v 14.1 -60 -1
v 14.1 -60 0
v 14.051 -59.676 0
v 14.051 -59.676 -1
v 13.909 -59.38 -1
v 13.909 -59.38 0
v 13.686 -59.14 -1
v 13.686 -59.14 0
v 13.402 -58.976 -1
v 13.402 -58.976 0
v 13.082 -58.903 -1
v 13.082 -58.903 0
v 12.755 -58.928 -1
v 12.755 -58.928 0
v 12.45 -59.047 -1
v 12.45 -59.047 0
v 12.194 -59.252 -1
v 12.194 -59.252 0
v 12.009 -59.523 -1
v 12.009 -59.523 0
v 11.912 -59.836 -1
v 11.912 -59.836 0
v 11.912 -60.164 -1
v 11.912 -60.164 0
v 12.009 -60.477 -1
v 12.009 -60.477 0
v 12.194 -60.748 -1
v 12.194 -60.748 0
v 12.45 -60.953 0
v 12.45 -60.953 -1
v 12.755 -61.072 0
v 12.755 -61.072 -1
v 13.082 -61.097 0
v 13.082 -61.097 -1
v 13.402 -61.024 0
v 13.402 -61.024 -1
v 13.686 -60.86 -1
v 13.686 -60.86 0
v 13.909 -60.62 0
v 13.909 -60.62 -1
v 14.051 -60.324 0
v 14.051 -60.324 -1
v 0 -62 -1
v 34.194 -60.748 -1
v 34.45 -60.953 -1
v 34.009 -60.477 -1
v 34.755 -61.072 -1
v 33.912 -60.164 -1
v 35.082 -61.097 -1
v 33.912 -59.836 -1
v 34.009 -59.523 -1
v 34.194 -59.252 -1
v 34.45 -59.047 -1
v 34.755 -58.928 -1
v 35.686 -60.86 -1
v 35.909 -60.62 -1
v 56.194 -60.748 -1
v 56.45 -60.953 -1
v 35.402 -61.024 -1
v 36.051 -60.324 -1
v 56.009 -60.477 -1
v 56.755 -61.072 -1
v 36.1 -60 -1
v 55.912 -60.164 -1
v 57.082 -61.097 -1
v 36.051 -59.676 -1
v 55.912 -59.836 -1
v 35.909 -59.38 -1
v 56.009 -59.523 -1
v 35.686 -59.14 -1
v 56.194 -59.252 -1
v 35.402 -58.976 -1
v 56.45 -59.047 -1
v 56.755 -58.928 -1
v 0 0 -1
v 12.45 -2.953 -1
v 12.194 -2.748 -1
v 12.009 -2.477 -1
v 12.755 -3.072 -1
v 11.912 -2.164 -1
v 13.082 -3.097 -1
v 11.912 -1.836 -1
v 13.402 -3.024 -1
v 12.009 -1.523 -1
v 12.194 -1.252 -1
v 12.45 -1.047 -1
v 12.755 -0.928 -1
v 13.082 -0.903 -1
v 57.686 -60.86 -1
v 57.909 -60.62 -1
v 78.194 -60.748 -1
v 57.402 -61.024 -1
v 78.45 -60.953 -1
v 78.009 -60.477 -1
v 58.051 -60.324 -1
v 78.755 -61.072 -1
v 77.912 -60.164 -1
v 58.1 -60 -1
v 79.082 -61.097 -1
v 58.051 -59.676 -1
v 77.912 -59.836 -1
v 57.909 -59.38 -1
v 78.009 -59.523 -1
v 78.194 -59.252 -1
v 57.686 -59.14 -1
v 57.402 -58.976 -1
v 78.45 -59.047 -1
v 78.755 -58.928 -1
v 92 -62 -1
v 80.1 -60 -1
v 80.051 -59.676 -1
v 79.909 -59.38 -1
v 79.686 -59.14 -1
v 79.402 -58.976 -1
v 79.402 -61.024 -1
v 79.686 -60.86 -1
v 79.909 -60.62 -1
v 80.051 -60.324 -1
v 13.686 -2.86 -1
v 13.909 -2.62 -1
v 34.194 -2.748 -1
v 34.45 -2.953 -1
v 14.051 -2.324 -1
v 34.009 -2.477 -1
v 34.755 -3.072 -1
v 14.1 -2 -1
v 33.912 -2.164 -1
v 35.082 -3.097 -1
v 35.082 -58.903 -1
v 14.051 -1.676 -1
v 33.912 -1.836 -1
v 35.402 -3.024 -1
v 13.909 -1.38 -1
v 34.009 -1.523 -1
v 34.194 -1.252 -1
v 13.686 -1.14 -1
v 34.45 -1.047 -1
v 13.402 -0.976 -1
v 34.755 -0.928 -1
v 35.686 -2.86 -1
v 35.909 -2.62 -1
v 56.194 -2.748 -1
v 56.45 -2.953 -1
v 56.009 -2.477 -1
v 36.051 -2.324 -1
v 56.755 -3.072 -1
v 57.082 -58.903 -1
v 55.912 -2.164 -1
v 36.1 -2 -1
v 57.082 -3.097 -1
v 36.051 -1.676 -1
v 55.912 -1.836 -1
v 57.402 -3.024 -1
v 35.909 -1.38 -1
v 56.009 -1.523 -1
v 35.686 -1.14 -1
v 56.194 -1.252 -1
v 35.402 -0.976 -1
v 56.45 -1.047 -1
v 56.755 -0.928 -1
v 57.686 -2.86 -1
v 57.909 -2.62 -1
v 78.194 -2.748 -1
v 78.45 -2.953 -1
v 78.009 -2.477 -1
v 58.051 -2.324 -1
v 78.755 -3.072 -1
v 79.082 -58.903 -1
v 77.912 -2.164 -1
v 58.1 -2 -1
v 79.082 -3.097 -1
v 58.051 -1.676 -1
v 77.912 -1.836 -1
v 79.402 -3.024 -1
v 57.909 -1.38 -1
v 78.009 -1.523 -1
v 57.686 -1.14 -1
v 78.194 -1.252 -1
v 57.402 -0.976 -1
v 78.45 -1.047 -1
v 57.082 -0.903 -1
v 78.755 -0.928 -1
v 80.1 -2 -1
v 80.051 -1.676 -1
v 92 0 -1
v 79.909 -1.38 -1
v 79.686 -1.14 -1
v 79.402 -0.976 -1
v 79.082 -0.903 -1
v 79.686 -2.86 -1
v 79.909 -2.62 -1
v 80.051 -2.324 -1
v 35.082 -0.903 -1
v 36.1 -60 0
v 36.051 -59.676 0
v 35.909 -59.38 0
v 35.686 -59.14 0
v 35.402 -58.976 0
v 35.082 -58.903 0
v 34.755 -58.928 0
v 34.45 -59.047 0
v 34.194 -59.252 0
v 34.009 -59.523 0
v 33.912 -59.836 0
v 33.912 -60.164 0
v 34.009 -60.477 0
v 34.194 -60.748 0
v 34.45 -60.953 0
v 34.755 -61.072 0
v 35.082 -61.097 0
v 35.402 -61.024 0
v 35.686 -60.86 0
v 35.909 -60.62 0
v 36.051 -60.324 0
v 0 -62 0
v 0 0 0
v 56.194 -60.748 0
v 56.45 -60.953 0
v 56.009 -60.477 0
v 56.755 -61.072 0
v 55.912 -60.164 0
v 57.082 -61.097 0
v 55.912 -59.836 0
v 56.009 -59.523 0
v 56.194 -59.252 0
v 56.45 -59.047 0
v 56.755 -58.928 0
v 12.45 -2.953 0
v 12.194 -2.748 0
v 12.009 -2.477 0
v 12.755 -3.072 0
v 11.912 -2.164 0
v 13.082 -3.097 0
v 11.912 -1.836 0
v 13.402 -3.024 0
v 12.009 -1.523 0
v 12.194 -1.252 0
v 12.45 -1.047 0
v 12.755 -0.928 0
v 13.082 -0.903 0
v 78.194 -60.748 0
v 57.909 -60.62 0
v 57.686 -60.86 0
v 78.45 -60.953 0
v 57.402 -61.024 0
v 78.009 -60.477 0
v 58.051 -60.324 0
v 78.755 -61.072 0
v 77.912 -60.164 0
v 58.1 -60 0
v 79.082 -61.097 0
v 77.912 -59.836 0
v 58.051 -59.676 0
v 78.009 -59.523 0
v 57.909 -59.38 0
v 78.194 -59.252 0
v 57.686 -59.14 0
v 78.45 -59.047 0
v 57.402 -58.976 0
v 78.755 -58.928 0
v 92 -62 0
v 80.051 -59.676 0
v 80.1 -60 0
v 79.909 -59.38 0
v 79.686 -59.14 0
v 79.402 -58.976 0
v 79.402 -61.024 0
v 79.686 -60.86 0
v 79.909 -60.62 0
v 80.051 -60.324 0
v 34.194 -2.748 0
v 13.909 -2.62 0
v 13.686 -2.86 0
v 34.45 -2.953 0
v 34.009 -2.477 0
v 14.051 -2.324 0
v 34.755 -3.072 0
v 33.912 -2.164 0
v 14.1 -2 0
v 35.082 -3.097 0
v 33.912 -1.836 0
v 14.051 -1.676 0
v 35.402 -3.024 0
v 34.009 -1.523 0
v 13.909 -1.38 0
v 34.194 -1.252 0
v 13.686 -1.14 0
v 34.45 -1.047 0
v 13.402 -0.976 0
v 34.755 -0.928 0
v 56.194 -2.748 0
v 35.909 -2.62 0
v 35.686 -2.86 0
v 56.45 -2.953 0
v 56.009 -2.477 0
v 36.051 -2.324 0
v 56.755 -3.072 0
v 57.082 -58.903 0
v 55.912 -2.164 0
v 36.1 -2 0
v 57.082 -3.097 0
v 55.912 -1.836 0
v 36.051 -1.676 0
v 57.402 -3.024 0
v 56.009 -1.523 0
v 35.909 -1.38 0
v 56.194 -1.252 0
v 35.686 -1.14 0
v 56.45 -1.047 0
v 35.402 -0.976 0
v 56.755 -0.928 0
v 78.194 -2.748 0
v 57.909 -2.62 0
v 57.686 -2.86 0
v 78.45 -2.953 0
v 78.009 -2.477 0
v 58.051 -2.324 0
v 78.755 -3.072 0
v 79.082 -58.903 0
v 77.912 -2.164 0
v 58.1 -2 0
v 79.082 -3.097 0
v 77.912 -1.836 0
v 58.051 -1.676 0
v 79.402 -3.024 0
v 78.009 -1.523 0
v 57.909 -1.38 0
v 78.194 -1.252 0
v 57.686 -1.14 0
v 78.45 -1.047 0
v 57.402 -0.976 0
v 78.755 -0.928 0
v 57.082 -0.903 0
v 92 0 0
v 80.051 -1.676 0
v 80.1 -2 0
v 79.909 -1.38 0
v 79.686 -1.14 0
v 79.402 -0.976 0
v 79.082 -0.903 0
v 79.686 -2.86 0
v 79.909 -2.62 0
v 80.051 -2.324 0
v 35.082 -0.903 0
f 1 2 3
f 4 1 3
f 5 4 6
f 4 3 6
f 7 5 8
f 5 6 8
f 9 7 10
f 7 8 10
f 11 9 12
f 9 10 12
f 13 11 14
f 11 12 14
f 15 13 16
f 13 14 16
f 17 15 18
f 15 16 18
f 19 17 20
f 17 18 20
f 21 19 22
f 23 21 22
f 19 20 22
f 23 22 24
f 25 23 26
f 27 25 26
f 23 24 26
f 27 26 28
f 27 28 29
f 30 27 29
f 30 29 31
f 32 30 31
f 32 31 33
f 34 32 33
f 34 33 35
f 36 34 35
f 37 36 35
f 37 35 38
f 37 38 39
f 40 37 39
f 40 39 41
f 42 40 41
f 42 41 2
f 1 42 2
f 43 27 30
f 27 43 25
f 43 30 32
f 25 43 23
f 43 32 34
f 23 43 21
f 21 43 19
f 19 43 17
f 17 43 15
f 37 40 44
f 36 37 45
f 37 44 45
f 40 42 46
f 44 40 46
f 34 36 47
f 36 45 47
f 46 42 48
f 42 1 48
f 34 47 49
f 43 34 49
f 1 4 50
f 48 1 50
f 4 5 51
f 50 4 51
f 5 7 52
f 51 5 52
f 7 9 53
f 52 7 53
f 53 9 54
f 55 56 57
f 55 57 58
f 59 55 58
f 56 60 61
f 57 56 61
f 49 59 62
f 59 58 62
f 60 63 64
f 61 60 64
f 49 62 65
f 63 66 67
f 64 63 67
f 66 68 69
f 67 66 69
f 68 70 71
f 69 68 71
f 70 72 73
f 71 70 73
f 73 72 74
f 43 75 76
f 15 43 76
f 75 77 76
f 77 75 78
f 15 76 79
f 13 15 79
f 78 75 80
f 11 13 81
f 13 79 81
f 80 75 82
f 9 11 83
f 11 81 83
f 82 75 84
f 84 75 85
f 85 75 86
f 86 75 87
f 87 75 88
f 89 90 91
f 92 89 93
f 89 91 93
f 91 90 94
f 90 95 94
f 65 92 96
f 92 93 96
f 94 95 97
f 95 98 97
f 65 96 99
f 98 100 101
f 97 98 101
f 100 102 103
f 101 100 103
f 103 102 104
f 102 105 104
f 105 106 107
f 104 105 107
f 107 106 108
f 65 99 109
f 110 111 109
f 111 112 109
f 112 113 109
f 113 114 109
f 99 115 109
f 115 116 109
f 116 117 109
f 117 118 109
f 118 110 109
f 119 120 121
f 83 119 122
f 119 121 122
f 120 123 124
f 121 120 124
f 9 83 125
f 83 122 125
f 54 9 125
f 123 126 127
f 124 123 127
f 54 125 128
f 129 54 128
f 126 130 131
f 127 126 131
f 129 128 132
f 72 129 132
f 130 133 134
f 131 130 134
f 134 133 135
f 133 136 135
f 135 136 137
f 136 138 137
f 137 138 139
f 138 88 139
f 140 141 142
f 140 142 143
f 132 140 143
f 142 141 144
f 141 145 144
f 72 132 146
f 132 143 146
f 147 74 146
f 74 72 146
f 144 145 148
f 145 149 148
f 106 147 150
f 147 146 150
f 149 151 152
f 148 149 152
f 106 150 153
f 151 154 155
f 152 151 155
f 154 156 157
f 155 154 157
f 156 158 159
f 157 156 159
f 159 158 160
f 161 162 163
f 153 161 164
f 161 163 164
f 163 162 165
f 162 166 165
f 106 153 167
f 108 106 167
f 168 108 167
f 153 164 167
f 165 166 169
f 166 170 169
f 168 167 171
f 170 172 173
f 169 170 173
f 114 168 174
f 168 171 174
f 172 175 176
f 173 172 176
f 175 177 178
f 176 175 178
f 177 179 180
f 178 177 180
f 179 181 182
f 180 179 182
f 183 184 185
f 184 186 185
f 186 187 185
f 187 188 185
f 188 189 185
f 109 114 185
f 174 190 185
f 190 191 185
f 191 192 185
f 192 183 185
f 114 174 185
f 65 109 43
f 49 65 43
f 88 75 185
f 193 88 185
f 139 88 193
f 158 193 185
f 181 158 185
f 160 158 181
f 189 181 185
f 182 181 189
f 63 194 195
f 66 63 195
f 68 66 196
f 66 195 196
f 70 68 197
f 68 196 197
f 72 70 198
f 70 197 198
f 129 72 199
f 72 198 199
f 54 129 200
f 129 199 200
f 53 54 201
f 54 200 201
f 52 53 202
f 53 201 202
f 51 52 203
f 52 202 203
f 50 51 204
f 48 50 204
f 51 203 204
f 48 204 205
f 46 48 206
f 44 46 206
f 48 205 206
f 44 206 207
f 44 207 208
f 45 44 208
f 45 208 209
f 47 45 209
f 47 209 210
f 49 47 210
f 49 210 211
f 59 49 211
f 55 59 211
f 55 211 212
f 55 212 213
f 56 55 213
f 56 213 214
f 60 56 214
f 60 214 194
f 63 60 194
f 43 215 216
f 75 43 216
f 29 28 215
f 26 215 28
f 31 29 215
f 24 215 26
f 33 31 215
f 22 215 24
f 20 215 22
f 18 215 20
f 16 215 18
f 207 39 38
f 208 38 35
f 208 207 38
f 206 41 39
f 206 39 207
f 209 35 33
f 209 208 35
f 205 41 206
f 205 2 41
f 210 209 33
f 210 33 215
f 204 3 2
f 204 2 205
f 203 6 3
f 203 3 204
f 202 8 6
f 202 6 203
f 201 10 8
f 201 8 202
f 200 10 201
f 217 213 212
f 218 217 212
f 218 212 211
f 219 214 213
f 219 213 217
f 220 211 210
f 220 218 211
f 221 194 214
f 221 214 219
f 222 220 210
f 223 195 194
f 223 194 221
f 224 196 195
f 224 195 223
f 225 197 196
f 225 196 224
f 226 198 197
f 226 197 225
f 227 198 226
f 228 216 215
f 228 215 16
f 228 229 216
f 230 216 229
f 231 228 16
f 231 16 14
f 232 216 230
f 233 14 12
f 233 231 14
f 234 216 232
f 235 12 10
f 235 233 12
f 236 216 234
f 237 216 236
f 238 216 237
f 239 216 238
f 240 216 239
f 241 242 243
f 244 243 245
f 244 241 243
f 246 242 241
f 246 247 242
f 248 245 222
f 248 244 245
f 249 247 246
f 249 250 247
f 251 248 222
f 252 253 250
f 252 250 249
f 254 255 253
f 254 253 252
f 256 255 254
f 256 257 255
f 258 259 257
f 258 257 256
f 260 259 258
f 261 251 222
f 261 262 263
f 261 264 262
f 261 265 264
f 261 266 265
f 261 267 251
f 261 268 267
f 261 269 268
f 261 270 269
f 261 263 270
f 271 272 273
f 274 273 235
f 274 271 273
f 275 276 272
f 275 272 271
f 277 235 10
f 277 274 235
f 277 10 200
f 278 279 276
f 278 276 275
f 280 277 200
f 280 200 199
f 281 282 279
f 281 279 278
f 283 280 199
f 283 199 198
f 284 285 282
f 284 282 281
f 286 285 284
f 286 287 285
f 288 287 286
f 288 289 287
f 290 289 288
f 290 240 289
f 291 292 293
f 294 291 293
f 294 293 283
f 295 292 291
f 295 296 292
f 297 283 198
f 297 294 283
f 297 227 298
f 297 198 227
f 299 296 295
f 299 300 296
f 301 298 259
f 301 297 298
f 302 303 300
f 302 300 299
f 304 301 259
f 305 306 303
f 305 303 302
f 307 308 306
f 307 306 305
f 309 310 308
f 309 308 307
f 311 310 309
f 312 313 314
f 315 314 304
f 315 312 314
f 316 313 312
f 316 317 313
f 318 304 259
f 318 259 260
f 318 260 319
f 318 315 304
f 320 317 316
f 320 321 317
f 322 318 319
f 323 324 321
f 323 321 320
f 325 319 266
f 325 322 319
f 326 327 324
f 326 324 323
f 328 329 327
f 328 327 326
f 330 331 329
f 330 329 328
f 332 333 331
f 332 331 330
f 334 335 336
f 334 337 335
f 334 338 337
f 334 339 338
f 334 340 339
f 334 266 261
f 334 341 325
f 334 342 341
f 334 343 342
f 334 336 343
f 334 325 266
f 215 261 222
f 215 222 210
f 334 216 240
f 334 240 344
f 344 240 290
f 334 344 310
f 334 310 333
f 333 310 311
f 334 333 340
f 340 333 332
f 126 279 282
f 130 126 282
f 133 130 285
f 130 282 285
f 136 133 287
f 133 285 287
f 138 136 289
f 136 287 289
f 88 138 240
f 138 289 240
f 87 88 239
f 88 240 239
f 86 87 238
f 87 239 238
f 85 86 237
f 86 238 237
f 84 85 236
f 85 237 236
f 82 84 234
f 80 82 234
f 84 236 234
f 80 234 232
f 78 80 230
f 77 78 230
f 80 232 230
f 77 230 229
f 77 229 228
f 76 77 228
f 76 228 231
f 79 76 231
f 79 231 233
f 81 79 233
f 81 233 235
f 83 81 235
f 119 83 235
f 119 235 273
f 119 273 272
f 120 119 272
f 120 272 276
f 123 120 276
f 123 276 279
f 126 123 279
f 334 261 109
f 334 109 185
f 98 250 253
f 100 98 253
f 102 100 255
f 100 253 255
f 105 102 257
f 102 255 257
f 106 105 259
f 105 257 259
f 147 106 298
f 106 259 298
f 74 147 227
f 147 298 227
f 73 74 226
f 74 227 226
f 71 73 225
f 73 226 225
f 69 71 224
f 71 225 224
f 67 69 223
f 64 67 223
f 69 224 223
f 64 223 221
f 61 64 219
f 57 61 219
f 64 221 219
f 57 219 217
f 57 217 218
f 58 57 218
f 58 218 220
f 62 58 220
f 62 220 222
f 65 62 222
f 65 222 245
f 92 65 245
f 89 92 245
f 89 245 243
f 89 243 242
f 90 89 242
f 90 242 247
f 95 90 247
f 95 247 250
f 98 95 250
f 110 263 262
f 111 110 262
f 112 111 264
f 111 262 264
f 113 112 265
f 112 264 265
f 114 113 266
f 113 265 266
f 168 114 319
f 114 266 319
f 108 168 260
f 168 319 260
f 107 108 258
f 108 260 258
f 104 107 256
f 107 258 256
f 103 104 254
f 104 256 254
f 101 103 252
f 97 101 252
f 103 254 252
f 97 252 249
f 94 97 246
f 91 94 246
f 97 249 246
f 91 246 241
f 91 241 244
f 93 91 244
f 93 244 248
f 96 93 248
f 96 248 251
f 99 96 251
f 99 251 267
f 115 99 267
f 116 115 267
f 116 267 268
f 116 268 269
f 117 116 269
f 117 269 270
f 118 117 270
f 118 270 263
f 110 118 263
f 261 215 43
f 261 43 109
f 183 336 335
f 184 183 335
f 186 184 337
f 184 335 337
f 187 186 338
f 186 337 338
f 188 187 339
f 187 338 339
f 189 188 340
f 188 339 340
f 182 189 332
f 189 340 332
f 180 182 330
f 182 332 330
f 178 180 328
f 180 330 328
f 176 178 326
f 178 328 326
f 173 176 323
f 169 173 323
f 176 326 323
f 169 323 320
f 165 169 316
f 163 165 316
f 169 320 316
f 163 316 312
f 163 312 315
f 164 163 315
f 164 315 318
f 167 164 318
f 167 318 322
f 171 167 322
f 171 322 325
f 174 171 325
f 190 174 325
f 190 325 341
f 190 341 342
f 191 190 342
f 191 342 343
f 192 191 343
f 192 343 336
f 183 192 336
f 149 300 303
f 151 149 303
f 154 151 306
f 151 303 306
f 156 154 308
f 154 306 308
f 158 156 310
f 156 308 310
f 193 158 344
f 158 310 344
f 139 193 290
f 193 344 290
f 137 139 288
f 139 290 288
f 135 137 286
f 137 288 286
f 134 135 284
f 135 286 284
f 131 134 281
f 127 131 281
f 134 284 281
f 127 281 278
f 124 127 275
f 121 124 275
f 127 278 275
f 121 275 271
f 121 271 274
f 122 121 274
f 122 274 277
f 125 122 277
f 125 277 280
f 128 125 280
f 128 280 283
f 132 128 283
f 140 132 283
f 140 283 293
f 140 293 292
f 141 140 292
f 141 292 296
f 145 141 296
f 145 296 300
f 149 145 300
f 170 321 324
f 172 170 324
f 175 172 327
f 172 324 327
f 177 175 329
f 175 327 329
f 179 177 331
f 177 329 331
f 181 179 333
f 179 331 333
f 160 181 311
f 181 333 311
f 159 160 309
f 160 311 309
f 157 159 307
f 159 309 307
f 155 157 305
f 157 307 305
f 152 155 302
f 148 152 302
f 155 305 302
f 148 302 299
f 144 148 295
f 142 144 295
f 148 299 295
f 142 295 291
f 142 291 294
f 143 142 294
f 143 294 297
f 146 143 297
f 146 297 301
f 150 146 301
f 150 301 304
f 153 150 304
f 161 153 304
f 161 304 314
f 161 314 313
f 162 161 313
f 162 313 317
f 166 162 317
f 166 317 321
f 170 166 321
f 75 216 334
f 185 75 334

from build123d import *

# Parameters (mm, degrees)
SKETCH1_W                  = 92
SKETCH1_H                  = 62
BOSS_EXTRUDE1_DEPTH        = 1
F_2_2_2_2_DIAMETER_HOLE2_D = 2.2


with BuildPart() as part:
    # Sketch1 → Boss-Extrude1 (new body)
    with BuildSketch(Plane.XY):
        with Locations((46, -31)):
            Rectangle(SKETCH1_W, SKETCH1_H)
    extrude(amount=-BOSS_EXTRUDE1_DEPTH)

    # Ø2.2 (2.2) Diameter Hole2 (through all)
    with Locations(Plane(origin=(0, 0, -1), x_dir=(-1, 0, 0), z_dir=(0, 0, -1))):
        with Locations((-79, -2), (-57, -2), (-35, -2), (-13, -2), (-13, -60), (-35, -60), (-57, -60), (-79, -60)):
            Hole(F_2_2_2_2_DIAMETER_HOLE2_D / 2)


solid = part.part
